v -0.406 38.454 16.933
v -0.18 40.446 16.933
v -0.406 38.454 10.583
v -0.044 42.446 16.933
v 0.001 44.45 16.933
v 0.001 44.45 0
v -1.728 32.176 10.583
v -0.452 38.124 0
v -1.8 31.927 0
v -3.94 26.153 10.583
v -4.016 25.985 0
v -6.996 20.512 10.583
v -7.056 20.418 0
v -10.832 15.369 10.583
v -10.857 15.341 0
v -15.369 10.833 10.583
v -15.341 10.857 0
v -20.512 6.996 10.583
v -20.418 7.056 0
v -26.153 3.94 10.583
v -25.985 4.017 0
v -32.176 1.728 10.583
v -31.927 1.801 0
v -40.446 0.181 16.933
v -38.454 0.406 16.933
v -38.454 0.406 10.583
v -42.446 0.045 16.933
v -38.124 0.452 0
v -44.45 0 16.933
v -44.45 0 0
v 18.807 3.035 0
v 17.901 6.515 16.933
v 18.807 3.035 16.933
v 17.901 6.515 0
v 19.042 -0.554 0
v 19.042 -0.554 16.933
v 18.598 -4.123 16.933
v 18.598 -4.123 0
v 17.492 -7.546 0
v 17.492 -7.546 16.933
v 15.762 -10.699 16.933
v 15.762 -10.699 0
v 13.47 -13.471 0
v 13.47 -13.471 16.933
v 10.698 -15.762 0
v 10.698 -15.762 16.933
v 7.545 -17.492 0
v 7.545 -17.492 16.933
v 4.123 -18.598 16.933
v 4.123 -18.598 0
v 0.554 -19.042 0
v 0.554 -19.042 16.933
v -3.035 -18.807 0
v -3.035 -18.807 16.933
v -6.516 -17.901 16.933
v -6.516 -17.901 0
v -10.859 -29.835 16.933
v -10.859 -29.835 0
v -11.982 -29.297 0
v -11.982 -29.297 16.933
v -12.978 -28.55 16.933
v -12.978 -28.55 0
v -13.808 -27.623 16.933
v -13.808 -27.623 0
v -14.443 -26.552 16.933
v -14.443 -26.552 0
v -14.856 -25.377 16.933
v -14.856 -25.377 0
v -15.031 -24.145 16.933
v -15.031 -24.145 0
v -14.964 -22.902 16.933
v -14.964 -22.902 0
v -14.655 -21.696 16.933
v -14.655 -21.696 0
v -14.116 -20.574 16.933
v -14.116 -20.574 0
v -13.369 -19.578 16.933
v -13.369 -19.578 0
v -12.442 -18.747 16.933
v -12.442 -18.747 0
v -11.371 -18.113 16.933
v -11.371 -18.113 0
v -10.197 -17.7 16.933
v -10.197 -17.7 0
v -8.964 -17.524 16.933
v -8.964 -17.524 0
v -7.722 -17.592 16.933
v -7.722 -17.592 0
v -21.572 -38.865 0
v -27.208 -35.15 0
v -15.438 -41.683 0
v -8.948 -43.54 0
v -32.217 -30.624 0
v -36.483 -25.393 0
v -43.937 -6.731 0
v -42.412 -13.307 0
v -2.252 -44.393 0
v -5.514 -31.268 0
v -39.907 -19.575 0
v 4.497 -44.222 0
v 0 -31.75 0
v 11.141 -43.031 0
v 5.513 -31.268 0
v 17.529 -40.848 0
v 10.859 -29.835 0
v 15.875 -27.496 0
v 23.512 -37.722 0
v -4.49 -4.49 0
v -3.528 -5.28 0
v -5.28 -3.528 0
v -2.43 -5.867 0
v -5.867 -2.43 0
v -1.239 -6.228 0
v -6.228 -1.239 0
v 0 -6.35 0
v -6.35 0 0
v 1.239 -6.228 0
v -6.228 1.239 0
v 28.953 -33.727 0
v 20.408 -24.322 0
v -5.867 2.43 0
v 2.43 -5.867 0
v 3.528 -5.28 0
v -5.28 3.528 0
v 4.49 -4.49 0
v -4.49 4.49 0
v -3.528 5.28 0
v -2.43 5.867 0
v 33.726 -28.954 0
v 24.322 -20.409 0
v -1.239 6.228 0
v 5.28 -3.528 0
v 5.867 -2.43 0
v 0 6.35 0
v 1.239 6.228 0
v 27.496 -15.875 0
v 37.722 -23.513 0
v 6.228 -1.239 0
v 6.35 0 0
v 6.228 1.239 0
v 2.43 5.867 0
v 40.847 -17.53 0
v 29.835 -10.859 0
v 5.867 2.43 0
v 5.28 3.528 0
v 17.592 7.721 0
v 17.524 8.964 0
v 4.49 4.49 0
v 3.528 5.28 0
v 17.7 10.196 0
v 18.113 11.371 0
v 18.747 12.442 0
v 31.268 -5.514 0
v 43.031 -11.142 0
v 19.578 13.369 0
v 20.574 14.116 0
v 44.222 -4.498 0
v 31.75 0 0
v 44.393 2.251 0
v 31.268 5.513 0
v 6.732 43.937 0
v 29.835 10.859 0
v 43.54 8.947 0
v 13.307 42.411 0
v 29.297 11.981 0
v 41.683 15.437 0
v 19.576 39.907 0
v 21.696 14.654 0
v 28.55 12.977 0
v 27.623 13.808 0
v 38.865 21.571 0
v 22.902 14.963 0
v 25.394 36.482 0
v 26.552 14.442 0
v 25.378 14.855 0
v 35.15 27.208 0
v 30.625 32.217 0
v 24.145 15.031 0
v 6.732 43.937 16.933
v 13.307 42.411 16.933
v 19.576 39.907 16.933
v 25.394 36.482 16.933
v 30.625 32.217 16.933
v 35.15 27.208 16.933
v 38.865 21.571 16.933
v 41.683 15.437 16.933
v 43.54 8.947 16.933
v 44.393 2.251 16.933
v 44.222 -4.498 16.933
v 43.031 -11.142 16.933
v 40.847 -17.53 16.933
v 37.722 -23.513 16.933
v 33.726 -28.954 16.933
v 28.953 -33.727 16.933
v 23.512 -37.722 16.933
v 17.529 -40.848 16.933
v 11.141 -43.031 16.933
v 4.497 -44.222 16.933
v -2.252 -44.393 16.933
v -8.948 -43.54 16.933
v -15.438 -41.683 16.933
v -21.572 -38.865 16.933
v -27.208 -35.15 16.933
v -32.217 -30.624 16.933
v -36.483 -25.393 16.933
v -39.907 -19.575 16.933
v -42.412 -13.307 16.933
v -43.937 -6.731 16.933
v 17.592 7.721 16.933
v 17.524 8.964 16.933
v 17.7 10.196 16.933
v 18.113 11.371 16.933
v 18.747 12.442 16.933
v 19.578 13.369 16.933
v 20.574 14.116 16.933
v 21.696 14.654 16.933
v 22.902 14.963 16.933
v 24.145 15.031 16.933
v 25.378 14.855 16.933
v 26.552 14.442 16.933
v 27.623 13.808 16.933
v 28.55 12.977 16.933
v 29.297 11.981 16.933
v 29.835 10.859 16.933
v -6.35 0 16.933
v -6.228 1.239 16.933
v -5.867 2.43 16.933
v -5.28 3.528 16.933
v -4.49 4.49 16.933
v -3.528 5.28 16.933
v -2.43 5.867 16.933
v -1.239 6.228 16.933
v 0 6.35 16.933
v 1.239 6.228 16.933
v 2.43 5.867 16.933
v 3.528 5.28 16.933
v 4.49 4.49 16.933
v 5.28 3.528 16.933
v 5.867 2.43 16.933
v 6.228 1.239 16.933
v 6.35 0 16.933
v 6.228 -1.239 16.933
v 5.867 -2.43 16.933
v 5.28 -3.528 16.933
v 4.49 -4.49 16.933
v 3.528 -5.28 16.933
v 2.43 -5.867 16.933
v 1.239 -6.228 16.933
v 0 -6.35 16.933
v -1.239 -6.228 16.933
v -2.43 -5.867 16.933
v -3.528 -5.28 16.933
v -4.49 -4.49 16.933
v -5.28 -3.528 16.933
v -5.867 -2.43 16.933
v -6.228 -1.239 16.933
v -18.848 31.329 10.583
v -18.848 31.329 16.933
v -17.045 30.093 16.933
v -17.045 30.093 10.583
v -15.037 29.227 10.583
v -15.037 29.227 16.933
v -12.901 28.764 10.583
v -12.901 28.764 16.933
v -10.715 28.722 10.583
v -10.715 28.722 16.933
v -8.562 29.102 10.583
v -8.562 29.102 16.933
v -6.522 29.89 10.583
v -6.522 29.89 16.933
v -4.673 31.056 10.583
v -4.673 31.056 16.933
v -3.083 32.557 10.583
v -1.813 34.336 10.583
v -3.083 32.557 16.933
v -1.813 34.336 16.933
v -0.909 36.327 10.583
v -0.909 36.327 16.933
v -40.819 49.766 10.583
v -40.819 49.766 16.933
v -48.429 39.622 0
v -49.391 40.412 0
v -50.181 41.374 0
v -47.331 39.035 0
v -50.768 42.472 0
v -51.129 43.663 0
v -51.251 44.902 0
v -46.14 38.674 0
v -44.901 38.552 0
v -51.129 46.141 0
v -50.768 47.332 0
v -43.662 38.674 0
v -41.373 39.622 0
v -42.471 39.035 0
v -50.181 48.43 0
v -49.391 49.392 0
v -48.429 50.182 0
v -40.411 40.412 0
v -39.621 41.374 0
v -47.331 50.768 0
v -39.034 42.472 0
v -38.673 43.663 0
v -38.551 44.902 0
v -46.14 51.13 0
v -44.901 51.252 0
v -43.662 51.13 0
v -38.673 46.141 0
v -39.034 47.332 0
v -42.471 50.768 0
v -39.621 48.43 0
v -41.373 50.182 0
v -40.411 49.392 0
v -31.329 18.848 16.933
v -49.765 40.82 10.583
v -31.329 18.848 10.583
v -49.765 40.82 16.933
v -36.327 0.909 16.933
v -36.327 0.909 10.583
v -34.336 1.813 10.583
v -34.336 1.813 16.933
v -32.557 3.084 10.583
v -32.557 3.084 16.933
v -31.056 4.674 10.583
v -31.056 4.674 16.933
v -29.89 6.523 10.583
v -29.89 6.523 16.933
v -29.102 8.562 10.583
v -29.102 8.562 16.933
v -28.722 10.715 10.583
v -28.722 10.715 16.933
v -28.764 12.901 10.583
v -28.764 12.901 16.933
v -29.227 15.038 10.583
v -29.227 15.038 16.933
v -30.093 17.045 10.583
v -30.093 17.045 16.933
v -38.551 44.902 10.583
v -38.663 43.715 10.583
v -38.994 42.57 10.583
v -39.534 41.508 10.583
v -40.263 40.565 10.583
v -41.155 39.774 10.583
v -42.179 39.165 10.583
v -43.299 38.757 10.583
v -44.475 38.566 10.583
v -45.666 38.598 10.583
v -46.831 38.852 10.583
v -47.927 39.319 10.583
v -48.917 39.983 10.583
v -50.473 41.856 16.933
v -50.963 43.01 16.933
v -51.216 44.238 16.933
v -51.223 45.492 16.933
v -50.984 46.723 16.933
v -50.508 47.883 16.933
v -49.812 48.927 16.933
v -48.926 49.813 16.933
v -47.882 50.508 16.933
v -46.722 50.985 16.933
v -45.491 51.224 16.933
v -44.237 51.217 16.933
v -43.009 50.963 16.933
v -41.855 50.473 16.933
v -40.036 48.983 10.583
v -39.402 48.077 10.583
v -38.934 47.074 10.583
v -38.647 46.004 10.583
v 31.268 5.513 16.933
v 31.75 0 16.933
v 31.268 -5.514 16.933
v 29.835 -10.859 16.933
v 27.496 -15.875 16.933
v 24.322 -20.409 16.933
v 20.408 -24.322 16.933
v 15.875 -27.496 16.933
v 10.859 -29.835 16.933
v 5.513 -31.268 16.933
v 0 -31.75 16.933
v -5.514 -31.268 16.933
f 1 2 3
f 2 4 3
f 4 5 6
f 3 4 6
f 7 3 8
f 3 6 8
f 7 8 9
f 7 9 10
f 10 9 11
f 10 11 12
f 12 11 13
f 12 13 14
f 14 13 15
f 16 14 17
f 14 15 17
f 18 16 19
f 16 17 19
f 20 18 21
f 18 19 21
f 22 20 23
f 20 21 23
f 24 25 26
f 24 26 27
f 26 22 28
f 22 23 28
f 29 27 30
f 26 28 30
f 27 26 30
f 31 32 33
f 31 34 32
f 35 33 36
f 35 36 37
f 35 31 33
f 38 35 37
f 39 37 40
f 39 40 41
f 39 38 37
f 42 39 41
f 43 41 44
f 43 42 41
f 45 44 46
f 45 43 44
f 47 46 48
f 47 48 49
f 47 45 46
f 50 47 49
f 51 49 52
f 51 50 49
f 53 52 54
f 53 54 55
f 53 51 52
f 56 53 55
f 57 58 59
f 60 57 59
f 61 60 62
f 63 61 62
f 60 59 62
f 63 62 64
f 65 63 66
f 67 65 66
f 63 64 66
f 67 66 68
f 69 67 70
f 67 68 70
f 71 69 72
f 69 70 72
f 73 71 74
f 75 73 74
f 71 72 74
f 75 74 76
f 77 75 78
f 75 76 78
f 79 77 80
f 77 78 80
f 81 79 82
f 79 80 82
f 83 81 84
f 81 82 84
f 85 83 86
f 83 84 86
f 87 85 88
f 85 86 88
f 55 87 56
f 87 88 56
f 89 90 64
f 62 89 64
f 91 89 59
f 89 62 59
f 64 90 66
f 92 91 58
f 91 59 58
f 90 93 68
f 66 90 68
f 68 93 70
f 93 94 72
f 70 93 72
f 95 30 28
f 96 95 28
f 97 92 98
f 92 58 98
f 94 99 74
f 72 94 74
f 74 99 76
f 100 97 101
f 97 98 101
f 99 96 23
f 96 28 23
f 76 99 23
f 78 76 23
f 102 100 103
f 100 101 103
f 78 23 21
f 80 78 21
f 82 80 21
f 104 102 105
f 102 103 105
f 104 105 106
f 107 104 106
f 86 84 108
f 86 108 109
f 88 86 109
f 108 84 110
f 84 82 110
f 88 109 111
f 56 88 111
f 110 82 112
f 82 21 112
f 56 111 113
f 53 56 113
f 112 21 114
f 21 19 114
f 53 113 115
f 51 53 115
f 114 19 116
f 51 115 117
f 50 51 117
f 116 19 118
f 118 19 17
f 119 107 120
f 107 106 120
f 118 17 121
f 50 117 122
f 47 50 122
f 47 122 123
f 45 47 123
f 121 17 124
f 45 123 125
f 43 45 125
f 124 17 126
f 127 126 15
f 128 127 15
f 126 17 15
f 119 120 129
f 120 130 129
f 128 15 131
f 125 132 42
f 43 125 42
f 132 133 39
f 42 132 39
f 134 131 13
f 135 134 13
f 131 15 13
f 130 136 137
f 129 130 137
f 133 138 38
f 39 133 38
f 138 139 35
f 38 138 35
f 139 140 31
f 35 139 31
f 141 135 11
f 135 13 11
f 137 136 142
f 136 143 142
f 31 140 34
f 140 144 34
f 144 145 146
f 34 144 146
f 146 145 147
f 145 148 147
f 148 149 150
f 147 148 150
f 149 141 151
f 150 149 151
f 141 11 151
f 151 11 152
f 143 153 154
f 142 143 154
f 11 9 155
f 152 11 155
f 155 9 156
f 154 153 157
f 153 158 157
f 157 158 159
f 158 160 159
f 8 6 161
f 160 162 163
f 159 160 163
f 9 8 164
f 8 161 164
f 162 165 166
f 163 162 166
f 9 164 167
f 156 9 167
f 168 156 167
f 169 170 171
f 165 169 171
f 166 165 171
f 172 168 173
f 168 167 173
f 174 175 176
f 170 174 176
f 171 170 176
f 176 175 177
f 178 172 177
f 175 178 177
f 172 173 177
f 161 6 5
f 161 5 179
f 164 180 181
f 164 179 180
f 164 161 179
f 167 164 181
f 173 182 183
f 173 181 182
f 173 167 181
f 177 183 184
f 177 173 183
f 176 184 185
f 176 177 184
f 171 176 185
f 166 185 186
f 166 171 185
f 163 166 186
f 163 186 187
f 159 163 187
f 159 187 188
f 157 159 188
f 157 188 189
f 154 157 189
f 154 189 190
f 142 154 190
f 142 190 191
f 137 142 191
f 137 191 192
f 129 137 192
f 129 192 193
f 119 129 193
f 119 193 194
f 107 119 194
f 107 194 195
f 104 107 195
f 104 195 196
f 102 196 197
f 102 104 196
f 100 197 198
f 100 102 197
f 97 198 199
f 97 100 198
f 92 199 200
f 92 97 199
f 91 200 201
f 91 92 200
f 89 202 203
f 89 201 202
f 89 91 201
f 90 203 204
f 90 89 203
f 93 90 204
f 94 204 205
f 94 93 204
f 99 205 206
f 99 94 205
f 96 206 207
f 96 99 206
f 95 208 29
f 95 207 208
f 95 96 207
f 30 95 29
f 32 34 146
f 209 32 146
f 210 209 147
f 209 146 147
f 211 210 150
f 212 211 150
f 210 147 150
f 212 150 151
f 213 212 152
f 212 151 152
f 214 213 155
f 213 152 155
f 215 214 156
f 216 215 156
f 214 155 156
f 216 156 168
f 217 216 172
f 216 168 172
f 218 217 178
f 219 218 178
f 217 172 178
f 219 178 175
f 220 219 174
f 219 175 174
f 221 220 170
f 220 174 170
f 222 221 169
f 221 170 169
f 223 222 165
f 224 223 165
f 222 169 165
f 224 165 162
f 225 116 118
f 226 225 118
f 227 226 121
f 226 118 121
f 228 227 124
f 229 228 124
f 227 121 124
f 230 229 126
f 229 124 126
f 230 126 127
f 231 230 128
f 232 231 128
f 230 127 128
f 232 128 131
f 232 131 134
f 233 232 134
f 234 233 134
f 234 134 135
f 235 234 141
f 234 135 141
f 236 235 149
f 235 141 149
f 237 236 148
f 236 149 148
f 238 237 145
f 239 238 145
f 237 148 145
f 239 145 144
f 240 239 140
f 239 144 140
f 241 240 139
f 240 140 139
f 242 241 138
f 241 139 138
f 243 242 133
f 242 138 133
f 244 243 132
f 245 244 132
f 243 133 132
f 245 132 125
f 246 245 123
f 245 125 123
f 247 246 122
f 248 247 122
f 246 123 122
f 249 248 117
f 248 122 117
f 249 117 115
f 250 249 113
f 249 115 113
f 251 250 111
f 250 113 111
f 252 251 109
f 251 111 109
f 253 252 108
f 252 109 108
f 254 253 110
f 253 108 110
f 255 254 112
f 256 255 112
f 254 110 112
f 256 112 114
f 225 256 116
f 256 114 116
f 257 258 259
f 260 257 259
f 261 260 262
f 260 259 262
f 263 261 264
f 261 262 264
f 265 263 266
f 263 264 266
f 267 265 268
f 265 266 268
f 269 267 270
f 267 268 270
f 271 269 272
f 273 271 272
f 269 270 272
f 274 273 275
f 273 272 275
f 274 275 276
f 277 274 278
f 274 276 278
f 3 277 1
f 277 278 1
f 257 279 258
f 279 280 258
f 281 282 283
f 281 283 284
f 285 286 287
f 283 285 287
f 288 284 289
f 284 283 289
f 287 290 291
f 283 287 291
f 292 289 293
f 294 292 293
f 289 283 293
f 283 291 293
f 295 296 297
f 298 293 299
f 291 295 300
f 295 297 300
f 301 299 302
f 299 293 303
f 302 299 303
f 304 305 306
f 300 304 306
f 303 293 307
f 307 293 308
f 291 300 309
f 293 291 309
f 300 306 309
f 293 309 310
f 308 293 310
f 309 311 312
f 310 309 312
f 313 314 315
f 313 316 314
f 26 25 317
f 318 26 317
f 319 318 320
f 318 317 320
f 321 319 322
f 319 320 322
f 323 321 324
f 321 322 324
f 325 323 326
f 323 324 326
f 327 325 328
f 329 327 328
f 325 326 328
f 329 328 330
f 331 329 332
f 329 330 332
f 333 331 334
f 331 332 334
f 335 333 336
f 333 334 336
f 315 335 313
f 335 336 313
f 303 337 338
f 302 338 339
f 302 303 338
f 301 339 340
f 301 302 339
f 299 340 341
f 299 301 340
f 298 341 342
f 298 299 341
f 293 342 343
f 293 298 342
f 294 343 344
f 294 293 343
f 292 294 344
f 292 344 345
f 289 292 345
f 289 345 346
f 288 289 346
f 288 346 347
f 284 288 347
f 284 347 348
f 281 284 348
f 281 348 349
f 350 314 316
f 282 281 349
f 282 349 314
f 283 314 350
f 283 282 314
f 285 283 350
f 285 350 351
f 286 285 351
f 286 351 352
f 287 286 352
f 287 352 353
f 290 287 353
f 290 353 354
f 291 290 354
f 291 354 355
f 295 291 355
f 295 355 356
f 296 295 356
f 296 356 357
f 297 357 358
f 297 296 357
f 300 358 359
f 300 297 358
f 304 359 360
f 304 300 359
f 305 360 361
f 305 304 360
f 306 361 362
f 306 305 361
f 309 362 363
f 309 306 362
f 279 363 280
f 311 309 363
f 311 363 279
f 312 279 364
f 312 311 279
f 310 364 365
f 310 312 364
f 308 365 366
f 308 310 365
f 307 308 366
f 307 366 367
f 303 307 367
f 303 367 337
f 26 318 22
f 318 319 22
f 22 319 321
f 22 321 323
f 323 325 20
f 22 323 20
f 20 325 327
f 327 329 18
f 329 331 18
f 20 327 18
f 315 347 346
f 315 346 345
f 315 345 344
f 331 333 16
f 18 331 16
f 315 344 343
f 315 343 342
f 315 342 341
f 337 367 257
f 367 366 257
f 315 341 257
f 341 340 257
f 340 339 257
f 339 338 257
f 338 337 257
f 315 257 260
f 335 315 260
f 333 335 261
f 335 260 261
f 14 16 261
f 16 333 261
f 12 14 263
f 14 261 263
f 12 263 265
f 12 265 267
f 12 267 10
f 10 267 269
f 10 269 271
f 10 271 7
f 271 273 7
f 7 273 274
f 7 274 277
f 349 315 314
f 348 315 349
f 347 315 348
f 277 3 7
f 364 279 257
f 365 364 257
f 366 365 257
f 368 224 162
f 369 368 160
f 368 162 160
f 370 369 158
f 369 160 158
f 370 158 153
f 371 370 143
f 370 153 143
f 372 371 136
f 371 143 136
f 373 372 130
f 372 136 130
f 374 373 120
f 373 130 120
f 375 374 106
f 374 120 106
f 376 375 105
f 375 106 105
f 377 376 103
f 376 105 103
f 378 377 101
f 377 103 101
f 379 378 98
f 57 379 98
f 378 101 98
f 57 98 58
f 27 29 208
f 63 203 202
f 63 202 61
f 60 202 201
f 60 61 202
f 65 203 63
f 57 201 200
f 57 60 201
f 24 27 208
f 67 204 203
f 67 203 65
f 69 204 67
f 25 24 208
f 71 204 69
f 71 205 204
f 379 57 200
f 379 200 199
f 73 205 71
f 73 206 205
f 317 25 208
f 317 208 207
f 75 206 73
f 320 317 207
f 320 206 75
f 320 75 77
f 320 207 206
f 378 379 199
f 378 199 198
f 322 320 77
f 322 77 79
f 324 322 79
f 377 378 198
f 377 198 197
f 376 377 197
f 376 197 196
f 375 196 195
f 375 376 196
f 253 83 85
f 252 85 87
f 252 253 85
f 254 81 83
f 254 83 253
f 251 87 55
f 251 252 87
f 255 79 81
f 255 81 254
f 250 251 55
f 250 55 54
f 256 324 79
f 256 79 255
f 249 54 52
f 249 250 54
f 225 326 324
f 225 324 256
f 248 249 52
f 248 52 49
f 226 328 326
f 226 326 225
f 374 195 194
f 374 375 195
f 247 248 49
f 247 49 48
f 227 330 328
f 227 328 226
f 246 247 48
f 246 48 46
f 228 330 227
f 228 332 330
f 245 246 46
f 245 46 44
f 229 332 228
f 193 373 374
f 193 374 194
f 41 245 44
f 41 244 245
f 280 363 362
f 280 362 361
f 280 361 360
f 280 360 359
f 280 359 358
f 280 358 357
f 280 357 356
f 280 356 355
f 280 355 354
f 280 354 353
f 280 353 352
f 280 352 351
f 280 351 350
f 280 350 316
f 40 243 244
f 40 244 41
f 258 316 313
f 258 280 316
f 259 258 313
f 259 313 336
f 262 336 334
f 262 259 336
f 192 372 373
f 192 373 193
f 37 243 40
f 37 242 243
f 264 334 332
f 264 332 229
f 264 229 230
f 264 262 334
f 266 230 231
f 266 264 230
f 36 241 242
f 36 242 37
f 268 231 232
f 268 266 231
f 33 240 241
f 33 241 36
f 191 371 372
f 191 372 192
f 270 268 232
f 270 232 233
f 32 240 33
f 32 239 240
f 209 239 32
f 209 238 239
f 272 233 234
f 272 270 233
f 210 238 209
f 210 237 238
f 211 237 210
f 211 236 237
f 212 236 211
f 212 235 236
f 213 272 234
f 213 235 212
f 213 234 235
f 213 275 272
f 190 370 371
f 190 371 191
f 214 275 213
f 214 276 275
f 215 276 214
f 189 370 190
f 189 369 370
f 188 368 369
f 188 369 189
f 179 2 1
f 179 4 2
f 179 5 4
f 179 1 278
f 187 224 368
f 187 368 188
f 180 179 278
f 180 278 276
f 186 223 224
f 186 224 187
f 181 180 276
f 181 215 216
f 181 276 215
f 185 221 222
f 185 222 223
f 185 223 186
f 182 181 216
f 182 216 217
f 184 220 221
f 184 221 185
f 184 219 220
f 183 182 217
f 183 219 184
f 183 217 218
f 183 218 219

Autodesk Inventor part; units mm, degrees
ref_plane "YZ Plane" through (0, 0, 0) normal (1, 0, 0) x (0, 1, 0)
ref_plane "XZ Plane" through (0, 0, 0) normal (0, 1, 0) x (-1, 0, 0)
ref_plane "XY Plane" through (0, 0, 0) normal (0, 0, 1) x (1, 0, 0)
sketch "Sketch1" plane through (0, 0, 0) normal (0, 0, 1) x (1, 0, 0)
  line L0 (0, 0) -> (-89.8017, 0) construction
  line L1 (-89.8017, 0) -> (-44.9009, 44.9017) construction
  line L2 (-44.9009, 44.9017) -> (0, 0) construction
  arc A0 (-44.45, 0) -> (0.0009, 44.45) centre (0, 0) ccw
  line L3 (-44.45, 0) -> (-44.45, 44.4509) construction
  line L4 (-44.45, 44.4509) -> (-44.9009, 44.9017) construction
  circle A1 centre (-44.9009, 44.9017) radius 6.35
  arc A2 (-44.45, 0) -> (0.0009, 44.45) centre (-44.45, 44.4509) ccw
  point P0 (-6.7351, 6.7353)
  dimension "d8" = 89.8017
  dimension "d9" = 63.5
  dimension "d10" = 63.5
  dimension "d11" = 44.45
  dimension "d12" = 12.7
extrude "Extrusion1" add sketch "Sketch1" along normal blind 16.9333
sketch "Sketch21" plane through (-44.9009, 44.9017, 16.9333) normal (0, 0, 1) x (1, 0, 0)
  circle A0 centre (0, 0) radius 6.35 projected
  line L0 (4.0817, 4.8643) -> (26.0532, -13.5723)
  arc A1 (0.4509, -44.9017) -> (44.9017, -0.4517) centre (0.4509, -0.4509) ccw projected
  line L1 (-4.8644, -4.0817) -> (13.5718, -26.0535)
  circle A2 centre (0, 0) radius 6.35 projected
  line L2 (31.882, -31.8827) -> (26.0532, -13.5723) construction
  line L3 (31.882, -31.8827) -> (13.5718, -26.0535) construction
  arc A3 (6.4466, -44.4955) -> (13.5718, -26.0535) centre (4.9239, -33.3098) ccw
  arc A4 (26.0532, -13.5723) -> (44.4954, -6.4475) centre (33.3097, -4.9246) ccw
  line L4 (0, 0) -> (31.882, -31.8827) construction
  line L5 (13.5718, -26.0535) -> (15.941, -15.9413) construction
  line L6 (15.941, -15.9413) -> (26.0532, -13.5723) construction
  point P0 (44.9009, -44.9017)
  dimension "d85" = 10
  dimension "d86" = 11.2889
extrude "Extrusion18" add sketch "Sketch21" against normal blind 6.35 contours A0 L0 A4 A1 A3 L1
sketch "Sketch22" plane through (0, 0, 0) normal (0, 0, -1) x (-1, 0, 0)
  arc A0 (-17.9012, 6.5153) -> (6.5157, -17.9011) centre (0, 0) ccw
  arc A1 (-29.8353, 10.8589) -> (10.8594, -29.8351) centre (0, 0) ccw
  line L0 (10.8594, -29.8351) -> (6.5157, -17.9011)
  line L1 (-29.8353, 10.8589) -> (-17.9012, 6.5153)
  circle A2 centre (44.9009, 44.9017) radius 6.35 construction
  line L2 (6.5157, -17.9011) -> (44.9009, 44.9017) construction
  line L3 (44.9009, 44.9017) -> (-17.9012, 6.5153) construction
  arc A3 (-17.9012, 6.5153) -> (-29.8353, 10.8589) centre (-23.8683, 8.6871) ccw
  arc A4 (10.8594, -29.8351) -> (6.5157, -17.9011) centre (8.6875, -23.8681) ccw
  dimension "d89" = 19.05
  dimension "d90" = 12.7
  dimension "d91" = 130
extrude "Extrusion19" cut sketch "Sketch22" against normal through all
sketch "Sketch23" plane through (0, 0, 0) normal (0, 0, -1) x (-1, 0, 0)
  circle A0 centre (0, 0) radius 6.35
  dimension "d94" = 12.7
extrude "Extrusion20" cut sketch "Sketch23" against normal through all
properties part number "Geneva Drive" material "ABS Plastic"
